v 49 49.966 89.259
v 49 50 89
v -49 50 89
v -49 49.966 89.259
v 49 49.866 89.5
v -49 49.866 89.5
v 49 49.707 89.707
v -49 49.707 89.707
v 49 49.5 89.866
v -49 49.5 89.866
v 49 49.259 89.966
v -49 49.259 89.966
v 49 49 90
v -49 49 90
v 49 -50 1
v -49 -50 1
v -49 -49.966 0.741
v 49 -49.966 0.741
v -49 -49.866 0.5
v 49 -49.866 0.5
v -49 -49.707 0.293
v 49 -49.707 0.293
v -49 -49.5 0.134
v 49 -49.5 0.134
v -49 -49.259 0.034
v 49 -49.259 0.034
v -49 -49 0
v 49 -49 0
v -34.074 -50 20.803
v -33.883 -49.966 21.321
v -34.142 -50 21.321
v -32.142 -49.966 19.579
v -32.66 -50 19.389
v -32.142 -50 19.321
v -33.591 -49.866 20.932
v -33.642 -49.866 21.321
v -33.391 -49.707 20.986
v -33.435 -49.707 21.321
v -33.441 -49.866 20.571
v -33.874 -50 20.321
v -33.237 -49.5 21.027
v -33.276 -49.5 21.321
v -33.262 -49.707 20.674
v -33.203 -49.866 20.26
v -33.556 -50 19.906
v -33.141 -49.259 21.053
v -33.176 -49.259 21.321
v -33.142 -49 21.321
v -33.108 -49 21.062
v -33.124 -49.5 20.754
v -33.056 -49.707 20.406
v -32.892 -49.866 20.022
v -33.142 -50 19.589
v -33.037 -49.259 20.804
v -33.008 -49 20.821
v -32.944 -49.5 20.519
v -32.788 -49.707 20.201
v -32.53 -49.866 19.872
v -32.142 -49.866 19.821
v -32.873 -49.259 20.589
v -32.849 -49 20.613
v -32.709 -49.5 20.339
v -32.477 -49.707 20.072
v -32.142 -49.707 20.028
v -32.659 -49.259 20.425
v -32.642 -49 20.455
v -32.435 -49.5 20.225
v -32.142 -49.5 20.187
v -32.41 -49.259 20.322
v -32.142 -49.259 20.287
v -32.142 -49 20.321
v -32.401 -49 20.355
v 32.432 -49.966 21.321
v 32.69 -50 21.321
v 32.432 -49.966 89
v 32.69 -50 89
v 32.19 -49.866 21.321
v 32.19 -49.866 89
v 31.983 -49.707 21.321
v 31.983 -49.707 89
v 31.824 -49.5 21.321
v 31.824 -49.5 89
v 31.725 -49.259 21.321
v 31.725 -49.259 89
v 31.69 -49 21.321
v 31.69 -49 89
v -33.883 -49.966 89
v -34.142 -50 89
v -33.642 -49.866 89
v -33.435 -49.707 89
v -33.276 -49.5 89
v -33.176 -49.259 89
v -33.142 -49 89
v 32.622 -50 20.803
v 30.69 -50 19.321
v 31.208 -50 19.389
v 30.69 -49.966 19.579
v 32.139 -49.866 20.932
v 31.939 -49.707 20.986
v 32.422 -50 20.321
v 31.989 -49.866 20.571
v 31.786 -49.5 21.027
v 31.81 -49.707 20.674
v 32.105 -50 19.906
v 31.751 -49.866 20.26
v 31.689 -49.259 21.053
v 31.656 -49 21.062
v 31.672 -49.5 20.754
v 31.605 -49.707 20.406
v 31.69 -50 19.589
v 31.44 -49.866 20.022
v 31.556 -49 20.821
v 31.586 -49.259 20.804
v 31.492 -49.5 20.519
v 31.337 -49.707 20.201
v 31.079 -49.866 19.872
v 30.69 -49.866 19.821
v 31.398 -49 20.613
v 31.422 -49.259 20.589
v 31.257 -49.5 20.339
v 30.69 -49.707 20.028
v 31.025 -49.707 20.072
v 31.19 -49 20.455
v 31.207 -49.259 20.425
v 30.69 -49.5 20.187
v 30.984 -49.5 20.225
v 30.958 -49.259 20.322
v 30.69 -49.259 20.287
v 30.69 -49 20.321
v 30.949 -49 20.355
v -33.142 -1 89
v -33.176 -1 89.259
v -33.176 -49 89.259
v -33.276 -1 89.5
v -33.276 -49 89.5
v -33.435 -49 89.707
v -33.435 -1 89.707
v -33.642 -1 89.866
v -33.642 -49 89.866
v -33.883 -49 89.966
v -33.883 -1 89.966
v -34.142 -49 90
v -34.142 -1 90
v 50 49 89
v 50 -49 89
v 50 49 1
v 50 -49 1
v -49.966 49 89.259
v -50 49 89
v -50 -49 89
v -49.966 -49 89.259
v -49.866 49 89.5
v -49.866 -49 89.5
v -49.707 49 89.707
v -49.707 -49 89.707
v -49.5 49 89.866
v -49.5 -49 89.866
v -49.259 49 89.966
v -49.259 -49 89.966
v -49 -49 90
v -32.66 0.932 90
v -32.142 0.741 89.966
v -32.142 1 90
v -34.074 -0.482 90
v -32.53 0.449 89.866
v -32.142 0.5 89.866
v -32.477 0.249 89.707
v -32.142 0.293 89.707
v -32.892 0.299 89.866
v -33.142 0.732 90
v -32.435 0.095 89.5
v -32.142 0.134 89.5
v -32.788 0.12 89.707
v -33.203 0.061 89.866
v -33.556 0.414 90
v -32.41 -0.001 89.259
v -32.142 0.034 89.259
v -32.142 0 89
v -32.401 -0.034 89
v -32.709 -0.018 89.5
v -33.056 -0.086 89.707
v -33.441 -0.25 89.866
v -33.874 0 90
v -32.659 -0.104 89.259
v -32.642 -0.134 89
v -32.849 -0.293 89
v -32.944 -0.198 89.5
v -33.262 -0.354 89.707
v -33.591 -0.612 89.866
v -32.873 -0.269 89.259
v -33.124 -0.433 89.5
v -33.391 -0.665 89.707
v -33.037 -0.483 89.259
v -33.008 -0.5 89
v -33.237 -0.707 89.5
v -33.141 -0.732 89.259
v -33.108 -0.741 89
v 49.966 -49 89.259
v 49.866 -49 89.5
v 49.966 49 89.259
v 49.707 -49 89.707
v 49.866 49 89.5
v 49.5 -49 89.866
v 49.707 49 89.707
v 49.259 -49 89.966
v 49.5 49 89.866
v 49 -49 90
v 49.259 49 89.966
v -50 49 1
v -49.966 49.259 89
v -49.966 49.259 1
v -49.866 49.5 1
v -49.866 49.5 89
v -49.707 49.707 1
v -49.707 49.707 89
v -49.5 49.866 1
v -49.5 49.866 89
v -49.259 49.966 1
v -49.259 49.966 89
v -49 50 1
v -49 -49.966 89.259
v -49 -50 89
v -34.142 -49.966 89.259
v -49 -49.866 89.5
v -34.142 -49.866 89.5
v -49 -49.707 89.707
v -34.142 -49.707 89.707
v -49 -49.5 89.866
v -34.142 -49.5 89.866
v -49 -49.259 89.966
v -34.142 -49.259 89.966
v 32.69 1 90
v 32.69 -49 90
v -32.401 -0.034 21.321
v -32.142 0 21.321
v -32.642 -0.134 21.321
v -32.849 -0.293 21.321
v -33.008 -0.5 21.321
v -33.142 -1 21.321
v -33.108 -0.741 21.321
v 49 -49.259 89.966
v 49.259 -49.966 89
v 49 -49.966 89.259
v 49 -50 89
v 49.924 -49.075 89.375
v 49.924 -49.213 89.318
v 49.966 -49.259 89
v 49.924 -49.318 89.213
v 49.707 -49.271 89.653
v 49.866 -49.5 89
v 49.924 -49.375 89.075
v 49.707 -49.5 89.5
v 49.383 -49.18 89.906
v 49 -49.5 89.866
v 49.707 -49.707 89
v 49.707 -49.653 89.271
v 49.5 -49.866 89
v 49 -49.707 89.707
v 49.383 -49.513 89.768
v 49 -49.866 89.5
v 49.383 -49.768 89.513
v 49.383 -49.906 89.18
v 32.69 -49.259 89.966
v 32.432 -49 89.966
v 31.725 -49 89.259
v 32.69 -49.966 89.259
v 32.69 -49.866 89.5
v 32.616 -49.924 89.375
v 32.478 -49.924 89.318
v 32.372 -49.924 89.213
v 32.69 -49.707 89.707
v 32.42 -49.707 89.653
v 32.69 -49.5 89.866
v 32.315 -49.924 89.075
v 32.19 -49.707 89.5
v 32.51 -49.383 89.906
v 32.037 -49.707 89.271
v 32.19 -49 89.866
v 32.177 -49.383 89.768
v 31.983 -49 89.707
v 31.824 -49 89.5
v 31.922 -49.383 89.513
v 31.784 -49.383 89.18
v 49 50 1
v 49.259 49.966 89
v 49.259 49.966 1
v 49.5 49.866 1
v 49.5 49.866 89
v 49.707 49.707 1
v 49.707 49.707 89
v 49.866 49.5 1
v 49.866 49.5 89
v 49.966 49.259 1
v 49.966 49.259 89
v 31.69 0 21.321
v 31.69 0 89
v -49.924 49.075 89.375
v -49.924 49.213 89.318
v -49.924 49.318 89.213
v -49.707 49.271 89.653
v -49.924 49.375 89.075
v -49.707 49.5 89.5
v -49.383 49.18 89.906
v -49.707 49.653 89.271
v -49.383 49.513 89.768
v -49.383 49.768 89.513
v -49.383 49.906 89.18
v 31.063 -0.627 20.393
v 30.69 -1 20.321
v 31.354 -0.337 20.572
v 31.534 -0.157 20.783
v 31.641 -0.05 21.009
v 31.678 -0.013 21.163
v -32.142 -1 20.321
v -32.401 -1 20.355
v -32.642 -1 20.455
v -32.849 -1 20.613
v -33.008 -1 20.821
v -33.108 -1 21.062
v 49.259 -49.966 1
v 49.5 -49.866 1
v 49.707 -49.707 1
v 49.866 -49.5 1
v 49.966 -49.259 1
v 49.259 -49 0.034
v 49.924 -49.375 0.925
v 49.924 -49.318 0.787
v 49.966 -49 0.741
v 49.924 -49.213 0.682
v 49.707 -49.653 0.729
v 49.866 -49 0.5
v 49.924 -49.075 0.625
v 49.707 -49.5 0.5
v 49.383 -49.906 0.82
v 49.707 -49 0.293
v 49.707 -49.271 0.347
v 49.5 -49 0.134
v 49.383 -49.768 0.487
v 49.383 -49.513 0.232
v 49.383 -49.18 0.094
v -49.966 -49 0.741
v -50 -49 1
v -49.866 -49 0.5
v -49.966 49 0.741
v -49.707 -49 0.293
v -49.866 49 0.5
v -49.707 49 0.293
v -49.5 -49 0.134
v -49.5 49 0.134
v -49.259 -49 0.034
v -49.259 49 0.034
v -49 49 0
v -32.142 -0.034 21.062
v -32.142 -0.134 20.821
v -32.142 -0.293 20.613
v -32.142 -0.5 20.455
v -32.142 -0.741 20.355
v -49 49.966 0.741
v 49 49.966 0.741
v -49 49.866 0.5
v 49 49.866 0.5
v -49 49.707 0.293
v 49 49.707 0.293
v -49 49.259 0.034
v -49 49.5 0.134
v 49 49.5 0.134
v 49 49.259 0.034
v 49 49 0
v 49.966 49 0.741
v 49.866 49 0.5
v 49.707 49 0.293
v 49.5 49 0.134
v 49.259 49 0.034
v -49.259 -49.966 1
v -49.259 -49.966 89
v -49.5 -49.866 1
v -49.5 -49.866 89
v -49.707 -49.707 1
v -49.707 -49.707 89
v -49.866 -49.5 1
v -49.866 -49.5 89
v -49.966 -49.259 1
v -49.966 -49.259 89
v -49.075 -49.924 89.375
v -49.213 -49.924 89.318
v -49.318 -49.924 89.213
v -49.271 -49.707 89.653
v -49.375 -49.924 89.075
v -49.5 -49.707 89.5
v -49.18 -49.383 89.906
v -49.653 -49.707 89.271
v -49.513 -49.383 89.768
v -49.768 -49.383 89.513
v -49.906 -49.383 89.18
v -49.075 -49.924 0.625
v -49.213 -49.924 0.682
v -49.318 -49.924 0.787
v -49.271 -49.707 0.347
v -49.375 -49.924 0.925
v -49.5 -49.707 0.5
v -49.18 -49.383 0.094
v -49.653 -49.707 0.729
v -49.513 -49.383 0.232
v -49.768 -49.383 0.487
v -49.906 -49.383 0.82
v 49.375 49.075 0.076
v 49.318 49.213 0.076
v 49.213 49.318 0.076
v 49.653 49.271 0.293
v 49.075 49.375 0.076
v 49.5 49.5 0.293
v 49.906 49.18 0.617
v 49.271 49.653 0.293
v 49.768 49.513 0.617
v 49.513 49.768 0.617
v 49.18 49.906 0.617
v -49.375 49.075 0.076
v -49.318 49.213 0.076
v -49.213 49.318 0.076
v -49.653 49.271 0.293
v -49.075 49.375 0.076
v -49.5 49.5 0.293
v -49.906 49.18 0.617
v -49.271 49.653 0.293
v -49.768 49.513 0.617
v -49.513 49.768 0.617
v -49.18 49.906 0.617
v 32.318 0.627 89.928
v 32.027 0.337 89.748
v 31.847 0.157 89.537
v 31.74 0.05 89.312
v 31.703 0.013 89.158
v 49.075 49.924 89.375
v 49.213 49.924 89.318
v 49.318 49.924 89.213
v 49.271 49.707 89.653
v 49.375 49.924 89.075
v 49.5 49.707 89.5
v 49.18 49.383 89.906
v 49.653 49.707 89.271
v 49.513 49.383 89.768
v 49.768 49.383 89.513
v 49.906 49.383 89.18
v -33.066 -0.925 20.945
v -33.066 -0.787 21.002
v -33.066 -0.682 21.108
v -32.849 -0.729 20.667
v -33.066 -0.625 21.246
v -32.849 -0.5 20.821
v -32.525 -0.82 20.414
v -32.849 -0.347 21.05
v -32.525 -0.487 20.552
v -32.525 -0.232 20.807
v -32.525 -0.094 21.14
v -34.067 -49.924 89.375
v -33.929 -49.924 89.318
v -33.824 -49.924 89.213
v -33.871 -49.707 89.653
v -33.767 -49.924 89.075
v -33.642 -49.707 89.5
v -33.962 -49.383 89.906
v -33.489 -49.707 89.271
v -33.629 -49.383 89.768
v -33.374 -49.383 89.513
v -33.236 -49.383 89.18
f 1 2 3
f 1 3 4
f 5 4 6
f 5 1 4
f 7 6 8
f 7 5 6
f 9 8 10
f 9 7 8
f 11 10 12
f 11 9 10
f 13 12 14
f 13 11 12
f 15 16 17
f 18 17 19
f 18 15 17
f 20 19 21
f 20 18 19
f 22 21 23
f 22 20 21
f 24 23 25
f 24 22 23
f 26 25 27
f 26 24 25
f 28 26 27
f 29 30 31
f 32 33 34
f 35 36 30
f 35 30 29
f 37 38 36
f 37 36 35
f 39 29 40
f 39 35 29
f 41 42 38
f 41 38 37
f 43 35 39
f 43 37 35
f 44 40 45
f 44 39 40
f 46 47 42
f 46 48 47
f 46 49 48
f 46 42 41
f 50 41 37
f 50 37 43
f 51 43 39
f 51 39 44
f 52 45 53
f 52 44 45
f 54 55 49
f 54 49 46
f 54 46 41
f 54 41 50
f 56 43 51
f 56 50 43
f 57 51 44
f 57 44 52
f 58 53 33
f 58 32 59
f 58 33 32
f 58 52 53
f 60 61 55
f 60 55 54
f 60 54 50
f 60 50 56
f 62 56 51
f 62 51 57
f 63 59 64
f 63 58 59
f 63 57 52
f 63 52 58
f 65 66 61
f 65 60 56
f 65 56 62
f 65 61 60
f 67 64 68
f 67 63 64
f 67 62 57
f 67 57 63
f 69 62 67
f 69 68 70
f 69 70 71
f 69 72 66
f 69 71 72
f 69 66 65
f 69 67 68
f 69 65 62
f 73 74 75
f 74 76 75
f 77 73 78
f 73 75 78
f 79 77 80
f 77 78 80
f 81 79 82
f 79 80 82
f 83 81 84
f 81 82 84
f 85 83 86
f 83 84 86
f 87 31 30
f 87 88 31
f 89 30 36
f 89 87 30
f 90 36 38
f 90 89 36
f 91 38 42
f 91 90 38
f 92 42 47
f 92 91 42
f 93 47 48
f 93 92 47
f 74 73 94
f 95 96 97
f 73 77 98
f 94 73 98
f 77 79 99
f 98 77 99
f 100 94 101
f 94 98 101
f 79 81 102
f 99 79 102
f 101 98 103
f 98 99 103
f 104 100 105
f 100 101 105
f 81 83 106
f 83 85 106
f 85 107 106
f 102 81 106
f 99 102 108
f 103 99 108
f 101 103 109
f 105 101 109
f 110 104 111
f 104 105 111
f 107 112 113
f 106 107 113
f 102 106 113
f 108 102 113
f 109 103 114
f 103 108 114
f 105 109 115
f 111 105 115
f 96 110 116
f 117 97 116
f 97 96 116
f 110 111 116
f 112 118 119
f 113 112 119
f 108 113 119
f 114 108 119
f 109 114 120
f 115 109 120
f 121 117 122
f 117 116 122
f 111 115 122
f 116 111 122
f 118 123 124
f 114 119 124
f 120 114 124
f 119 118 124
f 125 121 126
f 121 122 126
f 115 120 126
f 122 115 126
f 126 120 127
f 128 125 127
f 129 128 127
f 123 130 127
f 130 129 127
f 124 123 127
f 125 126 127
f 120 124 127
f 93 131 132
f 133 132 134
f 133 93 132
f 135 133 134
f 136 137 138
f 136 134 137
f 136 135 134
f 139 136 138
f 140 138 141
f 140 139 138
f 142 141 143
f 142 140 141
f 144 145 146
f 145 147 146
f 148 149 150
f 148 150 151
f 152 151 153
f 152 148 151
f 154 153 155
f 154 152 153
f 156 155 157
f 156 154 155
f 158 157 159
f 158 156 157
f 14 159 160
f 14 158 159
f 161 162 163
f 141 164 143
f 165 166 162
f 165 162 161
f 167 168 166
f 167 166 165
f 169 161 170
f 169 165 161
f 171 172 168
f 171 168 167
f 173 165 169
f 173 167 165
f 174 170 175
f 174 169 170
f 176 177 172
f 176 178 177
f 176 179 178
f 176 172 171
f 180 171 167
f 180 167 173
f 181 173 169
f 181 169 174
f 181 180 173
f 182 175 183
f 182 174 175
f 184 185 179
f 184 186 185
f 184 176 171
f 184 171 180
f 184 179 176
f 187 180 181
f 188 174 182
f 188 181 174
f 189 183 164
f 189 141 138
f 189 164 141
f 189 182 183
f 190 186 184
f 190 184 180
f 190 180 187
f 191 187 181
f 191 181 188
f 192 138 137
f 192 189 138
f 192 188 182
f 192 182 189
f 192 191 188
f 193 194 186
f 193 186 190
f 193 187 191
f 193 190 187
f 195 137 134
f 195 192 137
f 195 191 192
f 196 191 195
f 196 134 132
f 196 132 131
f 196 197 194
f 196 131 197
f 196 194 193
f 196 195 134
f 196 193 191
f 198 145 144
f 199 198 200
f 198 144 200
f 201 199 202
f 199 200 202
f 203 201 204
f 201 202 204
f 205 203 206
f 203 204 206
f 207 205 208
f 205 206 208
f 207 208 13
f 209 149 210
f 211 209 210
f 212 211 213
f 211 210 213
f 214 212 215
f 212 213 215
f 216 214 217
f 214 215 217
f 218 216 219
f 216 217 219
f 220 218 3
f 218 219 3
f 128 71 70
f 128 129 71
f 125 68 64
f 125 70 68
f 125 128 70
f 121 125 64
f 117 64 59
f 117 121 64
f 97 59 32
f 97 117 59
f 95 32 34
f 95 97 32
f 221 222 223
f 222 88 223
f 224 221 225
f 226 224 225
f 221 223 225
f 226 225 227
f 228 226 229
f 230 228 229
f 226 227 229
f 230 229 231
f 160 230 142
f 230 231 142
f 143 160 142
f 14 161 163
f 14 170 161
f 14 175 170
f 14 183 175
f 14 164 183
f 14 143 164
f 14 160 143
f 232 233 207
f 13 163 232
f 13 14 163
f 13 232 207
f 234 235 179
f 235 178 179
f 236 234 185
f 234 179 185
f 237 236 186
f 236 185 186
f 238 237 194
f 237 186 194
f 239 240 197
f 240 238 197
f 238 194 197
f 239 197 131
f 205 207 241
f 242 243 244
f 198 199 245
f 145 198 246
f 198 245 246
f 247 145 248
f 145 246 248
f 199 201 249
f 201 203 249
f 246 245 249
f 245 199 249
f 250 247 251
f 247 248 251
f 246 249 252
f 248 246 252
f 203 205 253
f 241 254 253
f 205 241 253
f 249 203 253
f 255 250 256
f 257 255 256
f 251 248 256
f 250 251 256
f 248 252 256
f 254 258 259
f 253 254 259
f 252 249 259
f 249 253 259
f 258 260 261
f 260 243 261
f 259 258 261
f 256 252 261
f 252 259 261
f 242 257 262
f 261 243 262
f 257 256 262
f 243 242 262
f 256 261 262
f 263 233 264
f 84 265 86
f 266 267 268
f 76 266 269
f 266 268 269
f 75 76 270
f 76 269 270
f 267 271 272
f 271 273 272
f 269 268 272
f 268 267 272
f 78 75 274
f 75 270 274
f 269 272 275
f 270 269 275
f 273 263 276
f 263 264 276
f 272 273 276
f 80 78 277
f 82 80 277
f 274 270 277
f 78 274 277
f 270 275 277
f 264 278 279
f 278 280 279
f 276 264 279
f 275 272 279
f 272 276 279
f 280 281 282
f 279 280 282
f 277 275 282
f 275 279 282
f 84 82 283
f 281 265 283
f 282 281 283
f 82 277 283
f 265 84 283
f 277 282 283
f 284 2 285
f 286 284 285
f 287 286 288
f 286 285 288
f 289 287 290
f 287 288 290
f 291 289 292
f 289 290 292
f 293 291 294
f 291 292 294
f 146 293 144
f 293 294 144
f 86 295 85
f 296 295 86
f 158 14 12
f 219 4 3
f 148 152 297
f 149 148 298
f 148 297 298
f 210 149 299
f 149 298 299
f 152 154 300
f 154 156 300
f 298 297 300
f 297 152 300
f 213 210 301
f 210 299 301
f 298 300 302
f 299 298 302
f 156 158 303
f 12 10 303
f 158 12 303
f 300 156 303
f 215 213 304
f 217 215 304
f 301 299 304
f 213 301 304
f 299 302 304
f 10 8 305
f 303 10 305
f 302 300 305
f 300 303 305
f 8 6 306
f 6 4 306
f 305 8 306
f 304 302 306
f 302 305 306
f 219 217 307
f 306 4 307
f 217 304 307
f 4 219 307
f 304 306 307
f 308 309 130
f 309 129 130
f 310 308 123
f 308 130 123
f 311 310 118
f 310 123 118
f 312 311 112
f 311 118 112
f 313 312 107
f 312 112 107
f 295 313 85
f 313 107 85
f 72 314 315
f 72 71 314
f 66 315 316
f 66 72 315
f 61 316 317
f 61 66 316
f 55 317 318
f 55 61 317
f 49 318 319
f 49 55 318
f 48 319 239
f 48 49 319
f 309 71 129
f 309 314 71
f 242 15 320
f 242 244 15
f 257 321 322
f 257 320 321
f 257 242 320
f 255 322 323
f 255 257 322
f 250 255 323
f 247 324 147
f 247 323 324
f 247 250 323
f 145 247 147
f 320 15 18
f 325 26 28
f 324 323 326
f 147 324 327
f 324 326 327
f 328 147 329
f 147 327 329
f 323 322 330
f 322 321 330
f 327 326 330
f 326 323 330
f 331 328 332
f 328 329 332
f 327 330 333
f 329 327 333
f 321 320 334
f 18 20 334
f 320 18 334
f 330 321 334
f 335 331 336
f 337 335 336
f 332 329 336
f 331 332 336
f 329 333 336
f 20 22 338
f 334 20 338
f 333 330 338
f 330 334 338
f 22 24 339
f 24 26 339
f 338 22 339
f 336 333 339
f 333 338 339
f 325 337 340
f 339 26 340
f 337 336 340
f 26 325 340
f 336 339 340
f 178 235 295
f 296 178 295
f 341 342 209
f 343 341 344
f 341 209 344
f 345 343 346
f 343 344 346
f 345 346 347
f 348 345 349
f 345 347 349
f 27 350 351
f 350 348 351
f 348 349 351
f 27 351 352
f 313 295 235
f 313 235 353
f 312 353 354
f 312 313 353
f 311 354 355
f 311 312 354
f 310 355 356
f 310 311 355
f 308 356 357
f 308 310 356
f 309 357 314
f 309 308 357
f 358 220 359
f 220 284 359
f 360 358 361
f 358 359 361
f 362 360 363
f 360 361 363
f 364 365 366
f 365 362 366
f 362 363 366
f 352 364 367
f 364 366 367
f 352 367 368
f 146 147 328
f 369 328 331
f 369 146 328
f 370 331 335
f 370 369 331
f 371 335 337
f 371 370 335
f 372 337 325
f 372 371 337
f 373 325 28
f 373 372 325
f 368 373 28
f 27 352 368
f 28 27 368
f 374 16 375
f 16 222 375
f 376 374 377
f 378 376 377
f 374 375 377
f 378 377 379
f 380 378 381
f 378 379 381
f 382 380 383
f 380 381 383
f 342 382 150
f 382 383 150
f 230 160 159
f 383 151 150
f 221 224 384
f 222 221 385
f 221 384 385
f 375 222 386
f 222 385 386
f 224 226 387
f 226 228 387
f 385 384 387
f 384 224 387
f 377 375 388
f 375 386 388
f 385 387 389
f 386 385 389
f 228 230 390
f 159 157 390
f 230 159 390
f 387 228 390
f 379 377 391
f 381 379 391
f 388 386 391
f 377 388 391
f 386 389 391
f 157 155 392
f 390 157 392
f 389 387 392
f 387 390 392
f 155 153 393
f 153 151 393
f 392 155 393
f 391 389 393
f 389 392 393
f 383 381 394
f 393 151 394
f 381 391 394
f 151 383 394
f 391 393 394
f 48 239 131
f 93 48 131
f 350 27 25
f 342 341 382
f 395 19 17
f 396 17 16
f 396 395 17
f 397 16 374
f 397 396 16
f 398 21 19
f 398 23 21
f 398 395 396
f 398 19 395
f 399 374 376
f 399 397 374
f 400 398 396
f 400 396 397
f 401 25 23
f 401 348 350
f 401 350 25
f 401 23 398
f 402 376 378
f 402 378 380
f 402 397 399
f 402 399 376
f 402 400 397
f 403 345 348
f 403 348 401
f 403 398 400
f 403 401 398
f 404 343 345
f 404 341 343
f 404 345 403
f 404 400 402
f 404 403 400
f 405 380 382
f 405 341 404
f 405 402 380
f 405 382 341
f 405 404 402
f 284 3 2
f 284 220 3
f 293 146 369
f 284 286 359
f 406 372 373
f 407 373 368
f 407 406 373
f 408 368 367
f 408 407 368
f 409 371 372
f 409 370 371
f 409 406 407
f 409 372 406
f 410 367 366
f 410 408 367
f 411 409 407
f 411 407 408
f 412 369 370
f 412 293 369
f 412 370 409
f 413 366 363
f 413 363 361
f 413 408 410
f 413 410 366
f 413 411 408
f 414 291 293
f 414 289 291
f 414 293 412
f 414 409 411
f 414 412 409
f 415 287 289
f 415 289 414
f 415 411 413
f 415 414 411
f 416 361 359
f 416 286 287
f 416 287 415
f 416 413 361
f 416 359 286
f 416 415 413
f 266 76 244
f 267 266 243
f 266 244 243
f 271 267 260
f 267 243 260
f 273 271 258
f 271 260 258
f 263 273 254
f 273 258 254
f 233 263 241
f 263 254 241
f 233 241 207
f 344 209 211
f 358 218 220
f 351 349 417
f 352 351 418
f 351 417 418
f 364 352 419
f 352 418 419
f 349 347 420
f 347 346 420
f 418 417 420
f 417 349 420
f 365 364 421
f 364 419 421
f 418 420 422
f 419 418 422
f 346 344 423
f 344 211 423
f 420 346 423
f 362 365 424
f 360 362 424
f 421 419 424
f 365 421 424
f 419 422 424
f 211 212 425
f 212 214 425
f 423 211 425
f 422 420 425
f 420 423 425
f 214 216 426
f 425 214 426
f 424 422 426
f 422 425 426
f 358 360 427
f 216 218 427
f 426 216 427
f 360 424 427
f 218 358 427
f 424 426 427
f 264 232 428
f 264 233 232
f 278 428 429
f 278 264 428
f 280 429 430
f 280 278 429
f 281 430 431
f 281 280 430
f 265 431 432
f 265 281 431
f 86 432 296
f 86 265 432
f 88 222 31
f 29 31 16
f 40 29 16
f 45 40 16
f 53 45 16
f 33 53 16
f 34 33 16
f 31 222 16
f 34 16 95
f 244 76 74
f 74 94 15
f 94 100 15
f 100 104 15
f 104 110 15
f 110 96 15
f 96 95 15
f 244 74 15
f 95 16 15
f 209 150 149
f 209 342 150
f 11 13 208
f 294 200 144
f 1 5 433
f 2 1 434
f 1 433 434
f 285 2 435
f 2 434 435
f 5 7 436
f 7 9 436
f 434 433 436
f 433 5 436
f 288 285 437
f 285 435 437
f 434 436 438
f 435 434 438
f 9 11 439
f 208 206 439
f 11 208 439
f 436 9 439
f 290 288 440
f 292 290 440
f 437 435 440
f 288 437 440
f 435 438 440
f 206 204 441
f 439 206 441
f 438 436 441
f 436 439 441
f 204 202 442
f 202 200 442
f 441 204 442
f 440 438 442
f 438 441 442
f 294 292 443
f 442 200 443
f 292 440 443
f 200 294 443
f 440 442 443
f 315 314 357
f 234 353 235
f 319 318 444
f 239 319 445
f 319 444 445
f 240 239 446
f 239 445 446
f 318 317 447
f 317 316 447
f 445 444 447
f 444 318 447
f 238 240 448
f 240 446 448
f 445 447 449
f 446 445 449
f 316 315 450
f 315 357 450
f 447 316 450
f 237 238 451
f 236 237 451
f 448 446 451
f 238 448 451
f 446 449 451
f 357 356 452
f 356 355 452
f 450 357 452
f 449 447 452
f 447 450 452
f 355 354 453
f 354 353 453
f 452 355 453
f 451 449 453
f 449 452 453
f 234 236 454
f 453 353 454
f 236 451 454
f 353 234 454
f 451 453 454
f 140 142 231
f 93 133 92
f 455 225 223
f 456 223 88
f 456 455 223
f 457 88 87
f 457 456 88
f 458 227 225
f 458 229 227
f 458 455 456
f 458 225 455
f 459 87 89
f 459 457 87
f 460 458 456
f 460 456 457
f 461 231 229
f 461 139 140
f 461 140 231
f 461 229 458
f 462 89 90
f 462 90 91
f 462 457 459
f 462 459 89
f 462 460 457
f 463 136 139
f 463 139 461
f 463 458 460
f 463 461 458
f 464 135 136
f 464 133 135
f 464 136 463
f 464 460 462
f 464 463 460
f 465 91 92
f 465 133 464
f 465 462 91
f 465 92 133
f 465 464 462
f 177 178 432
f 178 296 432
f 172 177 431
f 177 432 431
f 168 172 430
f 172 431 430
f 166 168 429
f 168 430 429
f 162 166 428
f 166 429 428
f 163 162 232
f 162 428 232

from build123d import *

# Parameters (mm, degrees)
F0_W     = 100
F0_H     = 100
F1_DEPTH = 90
F2_W     = 64.8323260248
F2_H     = 70.6382095814
F3_DEPTH = 50
F4_W     = 65.3021298349
F4_H     = 31.1890766025
F5_DEPTH = 25
F6_DEPTH = 50
F8_R     = 1


# Not quite as in the source:
# - a feature of the source that left no trace in its solid (it failed there, or was rolled back) is left out


with BuildPart() as f1:
    # F0 (on Top) → F1 (new body)
    with BuildSketch(Plane.XY):
        Rectangle(F0_W, F0_H)
    extrude(amount=F1_DEPTH)

    # F2 (on Front) → F3 (cut)
    with BuildSketch(Plane.XZ):
        with Locations((-0.7257331163, 55.6396842003)):
            Rectangle(F2_W, F2_H)
    extrude(amount=F3_DEPTH, mode=Mode.SUBTRACT)

    # F4 (on Top) → F5 (join)
    with BuildSketch(Plane.XY):
        with Locations((-0.2436619252, 15.5945383012)):
            Rectangle(F4_W, F4_H)
    extrude(amount=F5_DEPTH)

    # F4 (on Top) → F6 (join)
    with BuildSketch(Plane.XY):
        with Locations((-0.2436619252, 15.5945383012)):
            Rectangle(F4_W, F4_H)
    extrude(amount=F6_DEPTH)

    # F8
    f8_edges = [f1.edges().sort_by_distance(p)[0] for p in [
        (-33.141896, -25, 90),
        (31.69043, -25, 90),
        (40.845215, -50, 90),
        (50, 0, 90),
        (0, 50, 90),
        (-50, 0, 90),
        (-50, 50, 45),
        (-50, 0, 0),
        (-41.570948, -50, 90),
        (-33.141896, -50, 55.16029),
        (0, -50, 0),
        (-0.725733, -50, 20.320579),
        (31.69043, -25, 20.320579),
        (31.69043, -50, 55.16029),
        (50, -50, 45),
        (-0.725733, 0, 20.320579),
        (-33.141896, -25, 20.320579),
        (-33.141896, 0, 55.16029),
        (-50, -50, 45),
        (50, 50, 45),
        (50, 0, 0),
        (0, 50, 0),
        (-0.725733, 0, 90),
    ]]
    fillet(f8_edges, radius=F8_R)


solid = f1.part
